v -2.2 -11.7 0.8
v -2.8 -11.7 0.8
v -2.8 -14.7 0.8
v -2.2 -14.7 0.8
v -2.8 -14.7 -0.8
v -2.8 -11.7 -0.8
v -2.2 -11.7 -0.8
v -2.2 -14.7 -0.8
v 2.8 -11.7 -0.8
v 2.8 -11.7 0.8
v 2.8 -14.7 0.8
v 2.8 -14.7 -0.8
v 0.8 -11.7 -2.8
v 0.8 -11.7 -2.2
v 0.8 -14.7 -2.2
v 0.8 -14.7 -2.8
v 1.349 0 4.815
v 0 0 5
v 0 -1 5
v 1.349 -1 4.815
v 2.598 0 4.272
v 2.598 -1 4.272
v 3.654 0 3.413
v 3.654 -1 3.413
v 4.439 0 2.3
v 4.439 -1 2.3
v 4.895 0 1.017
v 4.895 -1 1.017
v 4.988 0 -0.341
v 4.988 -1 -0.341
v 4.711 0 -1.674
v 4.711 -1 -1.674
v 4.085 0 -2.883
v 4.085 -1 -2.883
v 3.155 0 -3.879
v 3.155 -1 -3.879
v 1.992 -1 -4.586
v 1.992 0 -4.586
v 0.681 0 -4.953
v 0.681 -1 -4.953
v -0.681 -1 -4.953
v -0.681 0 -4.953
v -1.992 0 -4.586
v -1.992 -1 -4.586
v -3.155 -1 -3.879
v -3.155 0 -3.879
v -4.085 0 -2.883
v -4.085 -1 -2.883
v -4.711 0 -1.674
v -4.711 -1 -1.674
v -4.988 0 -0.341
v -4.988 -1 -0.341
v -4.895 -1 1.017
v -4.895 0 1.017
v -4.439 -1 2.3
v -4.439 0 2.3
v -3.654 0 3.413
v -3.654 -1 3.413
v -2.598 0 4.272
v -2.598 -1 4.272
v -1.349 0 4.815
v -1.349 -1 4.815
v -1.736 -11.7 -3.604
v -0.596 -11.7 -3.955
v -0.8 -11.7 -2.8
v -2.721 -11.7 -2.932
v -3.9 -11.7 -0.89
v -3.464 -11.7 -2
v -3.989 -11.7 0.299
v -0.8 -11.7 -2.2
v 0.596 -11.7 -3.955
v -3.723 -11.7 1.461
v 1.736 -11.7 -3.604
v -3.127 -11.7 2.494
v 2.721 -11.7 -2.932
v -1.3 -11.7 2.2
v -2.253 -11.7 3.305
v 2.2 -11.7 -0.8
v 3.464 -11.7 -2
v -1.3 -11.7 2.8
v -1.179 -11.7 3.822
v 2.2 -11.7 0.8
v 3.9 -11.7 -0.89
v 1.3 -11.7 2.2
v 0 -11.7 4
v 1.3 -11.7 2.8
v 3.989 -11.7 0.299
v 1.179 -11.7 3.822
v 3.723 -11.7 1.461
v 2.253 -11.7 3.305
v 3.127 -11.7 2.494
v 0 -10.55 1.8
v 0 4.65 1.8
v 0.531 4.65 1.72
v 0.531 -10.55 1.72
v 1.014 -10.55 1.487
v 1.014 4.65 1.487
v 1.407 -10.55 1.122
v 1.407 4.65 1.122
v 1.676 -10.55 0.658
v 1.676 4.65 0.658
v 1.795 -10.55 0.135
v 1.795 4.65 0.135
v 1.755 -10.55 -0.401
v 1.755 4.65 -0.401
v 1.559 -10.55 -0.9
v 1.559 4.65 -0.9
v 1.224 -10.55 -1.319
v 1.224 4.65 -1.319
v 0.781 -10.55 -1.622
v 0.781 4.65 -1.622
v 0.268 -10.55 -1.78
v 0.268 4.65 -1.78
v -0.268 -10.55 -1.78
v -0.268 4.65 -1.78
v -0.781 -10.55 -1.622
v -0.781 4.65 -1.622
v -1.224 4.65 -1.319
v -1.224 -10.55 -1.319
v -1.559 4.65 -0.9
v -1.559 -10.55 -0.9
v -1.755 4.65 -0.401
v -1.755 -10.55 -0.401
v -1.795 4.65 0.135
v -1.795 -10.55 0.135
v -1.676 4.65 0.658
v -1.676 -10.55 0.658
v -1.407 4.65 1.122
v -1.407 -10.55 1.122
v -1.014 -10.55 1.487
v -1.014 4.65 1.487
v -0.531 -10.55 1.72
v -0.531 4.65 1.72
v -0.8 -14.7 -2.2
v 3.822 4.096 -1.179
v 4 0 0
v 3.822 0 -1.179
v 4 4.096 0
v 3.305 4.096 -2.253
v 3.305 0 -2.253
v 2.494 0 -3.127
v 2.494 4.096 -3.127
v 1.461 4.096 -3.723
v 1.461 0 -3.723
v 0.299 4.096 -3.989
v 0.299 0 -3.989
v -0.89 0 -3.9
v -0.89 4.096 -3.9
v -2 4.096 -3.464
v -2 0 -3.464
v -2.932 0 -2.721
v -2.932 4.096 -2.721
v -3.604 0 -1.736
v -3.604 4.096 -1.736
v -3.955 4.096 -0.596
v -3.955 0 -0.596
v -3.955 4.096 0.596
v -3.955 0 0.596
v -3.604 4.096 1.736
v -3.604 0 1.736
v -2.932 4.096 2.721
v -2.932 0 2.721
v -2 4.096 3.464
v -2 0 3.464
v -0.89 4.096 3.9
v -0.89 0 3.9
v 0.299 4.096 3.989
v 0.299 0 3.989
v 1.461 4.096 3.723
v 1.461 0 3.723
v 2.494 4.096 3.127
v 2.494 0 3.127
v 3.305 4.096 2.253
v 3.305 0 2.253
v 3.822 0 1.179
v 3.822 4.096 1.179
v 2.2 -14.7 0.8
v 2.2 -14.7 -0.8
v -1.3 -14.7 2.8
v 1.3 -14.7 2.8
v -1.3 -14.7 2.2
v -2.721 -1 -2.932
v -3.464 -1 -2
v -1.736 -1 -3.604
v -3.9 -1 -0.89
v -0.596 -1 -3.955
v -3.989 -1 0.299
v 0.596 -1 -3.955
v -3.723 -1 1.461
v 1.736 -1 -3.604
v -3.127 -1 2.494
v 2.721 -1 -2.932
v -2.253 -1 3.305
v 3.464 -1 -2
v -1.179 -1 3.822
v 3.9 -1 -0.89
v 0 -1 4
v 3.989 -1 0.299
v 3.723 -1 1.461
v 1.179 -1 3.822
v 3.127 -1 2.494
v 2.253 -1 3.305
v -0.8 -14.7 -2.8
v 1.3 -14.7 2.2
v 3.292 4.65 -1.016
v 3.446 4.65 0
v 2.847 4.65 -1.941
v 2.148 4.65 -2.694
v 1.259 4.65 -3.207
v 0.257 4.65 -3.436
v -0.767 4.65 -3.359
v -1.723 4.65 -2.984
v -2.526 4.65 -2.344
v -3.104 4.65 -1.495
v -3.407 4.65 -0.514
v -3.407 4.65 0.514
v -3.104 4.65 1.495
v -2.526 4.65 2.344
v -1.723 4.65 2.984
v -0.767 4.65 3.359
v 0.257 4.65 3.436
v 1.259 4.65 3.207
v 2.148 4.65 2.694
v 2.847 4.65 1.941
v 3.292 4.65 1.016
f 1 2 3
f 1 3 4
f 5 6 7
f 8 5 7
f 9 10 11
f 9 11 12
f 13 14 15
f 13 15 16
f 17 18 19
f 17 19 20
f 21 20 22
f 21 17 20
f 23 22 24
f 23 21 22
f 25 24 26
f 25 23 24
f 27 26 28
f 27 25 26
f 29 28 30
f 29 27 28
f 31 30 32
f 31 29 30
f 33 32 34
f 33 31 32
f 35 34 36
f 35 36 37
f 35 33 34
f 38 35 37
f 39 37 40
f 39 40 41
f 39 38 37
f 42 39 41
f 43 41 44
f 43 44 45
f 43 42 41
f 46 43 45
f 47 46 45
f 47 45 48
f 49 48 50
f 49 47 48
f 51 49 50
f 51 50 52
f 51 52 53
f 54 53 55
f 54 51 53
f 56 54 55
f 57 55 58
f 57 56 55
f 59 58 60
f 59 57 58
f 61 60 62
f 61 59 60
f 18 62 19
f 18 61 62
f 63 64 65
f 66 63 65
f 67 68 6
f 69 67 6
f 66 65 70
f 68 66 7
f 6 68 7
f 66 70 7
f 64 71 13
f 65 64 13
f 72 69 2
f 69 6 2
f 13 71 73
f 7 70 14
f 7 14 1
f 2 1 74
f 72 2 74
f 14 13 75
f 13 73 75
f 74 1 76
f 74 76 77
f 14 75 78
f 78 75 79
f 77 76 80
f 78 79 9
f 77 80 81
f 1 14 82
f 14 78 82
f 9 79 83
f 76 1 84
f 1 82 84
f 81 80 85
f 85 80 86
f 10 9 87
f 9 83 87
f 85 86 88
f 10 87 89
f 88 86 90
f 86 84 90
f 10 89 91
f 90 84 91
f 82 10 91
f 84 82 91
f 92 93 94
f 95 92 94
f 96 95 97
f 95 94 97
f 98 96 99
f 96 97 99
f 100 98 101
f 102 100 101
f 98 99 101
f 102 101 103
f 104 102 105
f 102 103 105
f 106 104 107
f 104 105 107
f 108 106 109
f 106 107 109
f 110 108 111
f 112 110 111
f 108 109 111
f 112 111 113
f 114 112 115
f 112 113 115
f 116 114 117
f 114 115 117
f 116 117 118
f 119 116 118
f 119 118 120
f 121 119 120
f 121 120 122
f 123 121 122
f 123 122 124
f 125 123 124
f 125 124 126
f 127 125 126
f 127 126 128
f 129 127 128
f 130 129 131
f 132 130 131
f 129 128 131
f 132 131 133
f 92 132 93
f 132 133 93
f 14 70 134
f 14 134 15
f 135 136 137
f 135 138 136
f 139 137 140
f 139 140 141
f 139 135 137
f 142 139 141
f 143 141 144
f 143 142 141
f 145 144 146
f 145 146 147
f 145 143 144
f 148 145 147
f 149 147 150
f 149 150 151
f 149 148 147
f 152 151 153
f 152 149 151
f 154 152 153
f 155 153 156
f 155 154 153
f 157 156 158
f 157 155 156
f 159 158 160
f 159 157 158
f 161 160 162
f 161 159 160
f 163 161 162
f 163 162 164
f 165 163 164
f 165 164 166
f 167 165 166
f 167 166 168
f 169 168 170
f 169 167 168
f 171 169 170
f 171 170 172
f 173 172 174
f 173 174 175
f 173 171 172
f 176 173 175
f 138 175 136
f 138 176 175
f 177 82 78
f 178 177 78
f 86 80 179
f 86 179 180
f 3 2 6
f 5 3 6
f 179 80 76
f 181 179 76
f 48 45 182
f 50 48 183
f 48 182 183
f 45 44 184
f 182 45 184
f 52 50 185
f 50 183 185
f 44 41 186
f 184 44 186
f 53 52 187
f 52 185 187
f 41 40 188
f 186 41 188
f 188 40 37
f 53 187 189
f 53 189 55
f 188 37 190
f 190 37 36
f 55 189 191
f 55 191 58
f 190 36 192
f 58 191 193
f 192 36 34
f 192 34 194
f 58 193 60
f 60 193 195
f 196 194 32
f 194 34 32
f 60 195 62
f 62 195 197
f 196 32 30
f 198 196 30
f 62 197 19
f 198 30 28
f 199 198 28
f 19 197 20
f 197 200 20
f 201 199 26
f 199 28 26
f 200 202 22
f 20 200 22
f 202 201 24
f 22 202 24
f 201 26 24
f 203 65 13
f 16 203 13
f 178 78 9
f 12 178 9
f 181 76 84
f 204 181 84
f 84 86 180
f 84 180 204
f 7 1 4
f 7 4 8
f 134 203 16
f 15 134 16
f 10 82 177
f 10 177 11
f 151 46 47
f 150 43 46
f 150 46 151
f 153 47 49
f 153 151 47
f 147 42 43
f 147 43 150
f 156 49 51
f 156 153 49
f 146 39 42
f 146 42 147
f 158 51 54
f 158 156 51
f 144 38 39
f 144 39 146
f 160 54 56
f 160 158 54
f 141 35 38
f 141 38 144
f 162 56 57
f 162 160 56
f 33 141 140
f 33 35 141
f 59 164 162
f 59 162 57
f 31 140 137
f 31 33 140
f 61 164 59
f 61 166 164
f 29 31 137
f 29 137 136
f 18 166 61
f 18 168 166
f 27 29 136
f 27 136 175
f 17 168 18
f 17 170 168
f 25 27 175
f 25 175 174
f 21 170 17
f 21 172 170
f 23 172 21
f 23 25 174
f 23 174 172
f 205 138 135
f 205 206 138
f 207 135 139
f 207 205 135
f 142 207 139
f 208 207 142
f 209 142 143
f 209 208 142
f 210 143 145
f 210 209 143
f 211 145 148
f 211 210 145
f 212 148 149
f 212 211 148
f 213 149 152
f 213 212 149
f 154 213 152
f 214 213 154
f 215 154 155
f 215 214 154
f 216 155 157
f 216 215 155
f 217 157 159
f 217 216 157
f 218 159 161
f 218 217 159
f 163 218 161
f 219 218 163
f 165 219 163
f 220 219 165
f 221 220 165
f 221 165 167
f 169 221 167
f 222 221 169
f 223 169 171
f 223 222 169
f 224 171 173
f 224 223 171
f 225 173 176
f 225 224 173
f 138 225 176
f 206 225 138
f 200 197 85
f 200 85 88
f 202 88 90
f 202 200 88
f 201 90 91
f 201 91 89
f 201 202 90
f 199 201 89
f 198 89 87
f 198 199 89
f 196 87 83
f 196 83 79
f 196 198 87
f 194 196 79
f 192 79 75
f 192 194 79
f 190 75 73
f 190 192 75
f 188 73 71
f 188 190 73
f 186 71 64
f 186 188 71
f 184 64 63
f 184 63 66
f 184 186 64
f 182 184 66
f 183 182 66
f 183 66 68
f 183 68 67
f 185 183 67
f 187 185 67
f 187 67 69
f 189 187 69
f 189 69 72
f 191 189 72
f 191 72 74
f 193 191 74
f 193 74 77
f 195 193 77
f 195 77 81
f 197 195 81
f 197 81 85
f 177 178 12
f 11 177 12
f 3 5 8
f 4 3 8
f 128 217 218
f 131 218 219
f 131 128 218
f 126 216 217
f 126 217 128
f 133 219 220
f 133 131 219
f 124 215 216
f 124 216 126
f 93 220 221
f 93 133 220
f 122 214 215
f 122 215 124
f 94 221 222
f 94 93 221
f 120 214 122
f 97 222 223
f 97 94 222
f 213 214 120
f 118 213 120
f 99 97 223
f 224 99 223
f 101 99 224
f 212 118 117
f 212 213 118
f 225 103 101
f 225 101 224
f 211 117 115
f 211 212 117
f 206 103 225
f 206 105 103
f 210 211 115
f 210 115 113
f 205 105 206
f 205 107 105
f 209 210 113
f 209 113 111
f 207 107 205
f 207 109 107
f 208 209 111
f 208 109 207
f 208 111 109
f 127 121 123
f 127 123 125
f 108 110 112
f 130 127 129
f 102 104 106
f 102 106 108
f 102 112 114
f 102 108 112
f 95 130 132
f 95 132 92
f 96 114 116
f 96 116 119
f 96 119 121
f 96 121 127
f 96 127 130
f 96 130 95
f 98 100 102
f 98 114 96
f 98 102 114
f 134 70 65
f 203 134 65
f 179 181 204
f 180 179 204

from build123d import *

# Parameters (mm, degrees)
SKETCH1_R           = 4
SKETCH1_R_2         = 1.8
SKETCH1_W           = 1.6
SKETCH1_H           = 0.6
SKETCH1_W_2         = 0.6
SKETCH1_H_2         = 1.6
SKETCH1_W_3         = 2.6
BOSS_EXTRUDE1_DEPTH = 11.7
SKETCH1_3_R         = 5
SKETCH1_3_R_2       = 4
BOSS_EXTRUDE2_DEPTH = 1
CUT_EXTRUDE1_START  = 4.65
SKETCH1_7_R         = 1.8
CUT_EXTRUDE1_DEPTH  = 15.2
BOSS_EXTRUDE5_START = -11.7
SKETCH1_8_W         = 0.6
SKETCH1_8_H         = 1.6
SKETCH1_8_W_2       = 1.6
SKETCH1_8_H_2       = 0.6
SKETCH1_8_W_3       = 2.6
BOSS_EXTRUDE5_DEPTH = 3


# Read off the part's stored shape, not the designer's step: M8x1.0 Machine Threads Stud3
with BuildPart() as part:
    # Sketch1 → Boss-Extrude1 (new body)
    with BuildSketch(Plane(origin=(0, 0, 0), x_dir=(1, 0, 0), z_dir=(0, 1, 0))):
        with Locations(Location((0, 0, 0), (0, 0, 270))):
            Circle(SKETCH1_R)
        Circle(SKETCH1_R_2)
        with Locations((0, 2.5)):
            Rectangle(SKETCH1_W, SKETCH1_H)
        with Locations((2.5, 0)):
            Rectangle(SKETCH1_W_2, SKETCH1_H_2)
        with Locations((0, -2.5)):
            Rectangle(SKETCH1_W_3, SKETCH1_H)
        with Locations((-2.5, 0)):
            Rectangle(SKETCH1_W_2, SKETCH1_H_2)
    extrude(amount=-BOSS_EXTRUDE1_DEPTH)

    # Sketch1<3> → Boss-Extrude2 (add)
    with BuildSketch(Plane(origin=(0, 0, 0), x_dir=(1, 0, 0), z_dir=(0, 1, 0))):
        with Locations(Location((0, 0, 0), (0, 0, 270))):
            Circle(SKETCH1_3_R)
        with Locations(Location((0, 0, 0), (0, 0, 270))):
            Circle(SKETCH1_3_R_2, mode=Mode.SUBTRACT)
    extrude(amount=-BOSS_EXTRUDE2_DEPTH)

    # M8x1.0 Machine Threads Stud3 outline → M8x1.0 Machine Threads Stud3 (revolve)
    with BuildSketch(Plane.XY):
        Polygon((4, 0), (4, 4.0955), (3.4455, 4.65), (0, 4.65), (0, 0), align=None)
    revolve(axis=Axis((0, 0, 0), (0, 1, 0)))

    # Sketch1<7> → Cut-Extrude1 (cut)
    with BuildSketch(Plane(origin=(0, 0, 0), x_dir=(1, 0, 0), z_dir=(0, 1, 0)).offset(CUT_EXTRUDE1_START)):
        with Locations(Location((0, 0, 0), (0, 0, 270))):
            Circle(SKETCH1_7_R)
    extrude(amount=-CUT_EXTRUDE1_DEPTH, mode=Mode.SUBTRACT)

    # Sketch1<8> → Boss-Extrude5 (add)
    with BuildSketch(Plane(origin=(0, 0, 0), x_dir=(1, 0, 0), z_dir=(0, 1, 0)).offset(BOSS_EXTRUDE5_START)):
        with Locations((2.5, 0)):
            Rectangle(SKETCH1_8_W, SKETCH1_8_H)
        with Locations((0, 2.5)):
            Rectangle(SKETCH1_8_W_2, SKETCH1_8_H_2)
        with Locations((-2.5, 0)):
            Rectangle(SKETCH1_8_W, SKETCH1_8_H)
        with Locations((0, -2.5)):
            Rectangle(SKETCH1_8_W_3, SKETCH1_8_H_2)
    extrude(amount=-BOSS_EXTRUDE5_DEPTH)


solid = part.part
